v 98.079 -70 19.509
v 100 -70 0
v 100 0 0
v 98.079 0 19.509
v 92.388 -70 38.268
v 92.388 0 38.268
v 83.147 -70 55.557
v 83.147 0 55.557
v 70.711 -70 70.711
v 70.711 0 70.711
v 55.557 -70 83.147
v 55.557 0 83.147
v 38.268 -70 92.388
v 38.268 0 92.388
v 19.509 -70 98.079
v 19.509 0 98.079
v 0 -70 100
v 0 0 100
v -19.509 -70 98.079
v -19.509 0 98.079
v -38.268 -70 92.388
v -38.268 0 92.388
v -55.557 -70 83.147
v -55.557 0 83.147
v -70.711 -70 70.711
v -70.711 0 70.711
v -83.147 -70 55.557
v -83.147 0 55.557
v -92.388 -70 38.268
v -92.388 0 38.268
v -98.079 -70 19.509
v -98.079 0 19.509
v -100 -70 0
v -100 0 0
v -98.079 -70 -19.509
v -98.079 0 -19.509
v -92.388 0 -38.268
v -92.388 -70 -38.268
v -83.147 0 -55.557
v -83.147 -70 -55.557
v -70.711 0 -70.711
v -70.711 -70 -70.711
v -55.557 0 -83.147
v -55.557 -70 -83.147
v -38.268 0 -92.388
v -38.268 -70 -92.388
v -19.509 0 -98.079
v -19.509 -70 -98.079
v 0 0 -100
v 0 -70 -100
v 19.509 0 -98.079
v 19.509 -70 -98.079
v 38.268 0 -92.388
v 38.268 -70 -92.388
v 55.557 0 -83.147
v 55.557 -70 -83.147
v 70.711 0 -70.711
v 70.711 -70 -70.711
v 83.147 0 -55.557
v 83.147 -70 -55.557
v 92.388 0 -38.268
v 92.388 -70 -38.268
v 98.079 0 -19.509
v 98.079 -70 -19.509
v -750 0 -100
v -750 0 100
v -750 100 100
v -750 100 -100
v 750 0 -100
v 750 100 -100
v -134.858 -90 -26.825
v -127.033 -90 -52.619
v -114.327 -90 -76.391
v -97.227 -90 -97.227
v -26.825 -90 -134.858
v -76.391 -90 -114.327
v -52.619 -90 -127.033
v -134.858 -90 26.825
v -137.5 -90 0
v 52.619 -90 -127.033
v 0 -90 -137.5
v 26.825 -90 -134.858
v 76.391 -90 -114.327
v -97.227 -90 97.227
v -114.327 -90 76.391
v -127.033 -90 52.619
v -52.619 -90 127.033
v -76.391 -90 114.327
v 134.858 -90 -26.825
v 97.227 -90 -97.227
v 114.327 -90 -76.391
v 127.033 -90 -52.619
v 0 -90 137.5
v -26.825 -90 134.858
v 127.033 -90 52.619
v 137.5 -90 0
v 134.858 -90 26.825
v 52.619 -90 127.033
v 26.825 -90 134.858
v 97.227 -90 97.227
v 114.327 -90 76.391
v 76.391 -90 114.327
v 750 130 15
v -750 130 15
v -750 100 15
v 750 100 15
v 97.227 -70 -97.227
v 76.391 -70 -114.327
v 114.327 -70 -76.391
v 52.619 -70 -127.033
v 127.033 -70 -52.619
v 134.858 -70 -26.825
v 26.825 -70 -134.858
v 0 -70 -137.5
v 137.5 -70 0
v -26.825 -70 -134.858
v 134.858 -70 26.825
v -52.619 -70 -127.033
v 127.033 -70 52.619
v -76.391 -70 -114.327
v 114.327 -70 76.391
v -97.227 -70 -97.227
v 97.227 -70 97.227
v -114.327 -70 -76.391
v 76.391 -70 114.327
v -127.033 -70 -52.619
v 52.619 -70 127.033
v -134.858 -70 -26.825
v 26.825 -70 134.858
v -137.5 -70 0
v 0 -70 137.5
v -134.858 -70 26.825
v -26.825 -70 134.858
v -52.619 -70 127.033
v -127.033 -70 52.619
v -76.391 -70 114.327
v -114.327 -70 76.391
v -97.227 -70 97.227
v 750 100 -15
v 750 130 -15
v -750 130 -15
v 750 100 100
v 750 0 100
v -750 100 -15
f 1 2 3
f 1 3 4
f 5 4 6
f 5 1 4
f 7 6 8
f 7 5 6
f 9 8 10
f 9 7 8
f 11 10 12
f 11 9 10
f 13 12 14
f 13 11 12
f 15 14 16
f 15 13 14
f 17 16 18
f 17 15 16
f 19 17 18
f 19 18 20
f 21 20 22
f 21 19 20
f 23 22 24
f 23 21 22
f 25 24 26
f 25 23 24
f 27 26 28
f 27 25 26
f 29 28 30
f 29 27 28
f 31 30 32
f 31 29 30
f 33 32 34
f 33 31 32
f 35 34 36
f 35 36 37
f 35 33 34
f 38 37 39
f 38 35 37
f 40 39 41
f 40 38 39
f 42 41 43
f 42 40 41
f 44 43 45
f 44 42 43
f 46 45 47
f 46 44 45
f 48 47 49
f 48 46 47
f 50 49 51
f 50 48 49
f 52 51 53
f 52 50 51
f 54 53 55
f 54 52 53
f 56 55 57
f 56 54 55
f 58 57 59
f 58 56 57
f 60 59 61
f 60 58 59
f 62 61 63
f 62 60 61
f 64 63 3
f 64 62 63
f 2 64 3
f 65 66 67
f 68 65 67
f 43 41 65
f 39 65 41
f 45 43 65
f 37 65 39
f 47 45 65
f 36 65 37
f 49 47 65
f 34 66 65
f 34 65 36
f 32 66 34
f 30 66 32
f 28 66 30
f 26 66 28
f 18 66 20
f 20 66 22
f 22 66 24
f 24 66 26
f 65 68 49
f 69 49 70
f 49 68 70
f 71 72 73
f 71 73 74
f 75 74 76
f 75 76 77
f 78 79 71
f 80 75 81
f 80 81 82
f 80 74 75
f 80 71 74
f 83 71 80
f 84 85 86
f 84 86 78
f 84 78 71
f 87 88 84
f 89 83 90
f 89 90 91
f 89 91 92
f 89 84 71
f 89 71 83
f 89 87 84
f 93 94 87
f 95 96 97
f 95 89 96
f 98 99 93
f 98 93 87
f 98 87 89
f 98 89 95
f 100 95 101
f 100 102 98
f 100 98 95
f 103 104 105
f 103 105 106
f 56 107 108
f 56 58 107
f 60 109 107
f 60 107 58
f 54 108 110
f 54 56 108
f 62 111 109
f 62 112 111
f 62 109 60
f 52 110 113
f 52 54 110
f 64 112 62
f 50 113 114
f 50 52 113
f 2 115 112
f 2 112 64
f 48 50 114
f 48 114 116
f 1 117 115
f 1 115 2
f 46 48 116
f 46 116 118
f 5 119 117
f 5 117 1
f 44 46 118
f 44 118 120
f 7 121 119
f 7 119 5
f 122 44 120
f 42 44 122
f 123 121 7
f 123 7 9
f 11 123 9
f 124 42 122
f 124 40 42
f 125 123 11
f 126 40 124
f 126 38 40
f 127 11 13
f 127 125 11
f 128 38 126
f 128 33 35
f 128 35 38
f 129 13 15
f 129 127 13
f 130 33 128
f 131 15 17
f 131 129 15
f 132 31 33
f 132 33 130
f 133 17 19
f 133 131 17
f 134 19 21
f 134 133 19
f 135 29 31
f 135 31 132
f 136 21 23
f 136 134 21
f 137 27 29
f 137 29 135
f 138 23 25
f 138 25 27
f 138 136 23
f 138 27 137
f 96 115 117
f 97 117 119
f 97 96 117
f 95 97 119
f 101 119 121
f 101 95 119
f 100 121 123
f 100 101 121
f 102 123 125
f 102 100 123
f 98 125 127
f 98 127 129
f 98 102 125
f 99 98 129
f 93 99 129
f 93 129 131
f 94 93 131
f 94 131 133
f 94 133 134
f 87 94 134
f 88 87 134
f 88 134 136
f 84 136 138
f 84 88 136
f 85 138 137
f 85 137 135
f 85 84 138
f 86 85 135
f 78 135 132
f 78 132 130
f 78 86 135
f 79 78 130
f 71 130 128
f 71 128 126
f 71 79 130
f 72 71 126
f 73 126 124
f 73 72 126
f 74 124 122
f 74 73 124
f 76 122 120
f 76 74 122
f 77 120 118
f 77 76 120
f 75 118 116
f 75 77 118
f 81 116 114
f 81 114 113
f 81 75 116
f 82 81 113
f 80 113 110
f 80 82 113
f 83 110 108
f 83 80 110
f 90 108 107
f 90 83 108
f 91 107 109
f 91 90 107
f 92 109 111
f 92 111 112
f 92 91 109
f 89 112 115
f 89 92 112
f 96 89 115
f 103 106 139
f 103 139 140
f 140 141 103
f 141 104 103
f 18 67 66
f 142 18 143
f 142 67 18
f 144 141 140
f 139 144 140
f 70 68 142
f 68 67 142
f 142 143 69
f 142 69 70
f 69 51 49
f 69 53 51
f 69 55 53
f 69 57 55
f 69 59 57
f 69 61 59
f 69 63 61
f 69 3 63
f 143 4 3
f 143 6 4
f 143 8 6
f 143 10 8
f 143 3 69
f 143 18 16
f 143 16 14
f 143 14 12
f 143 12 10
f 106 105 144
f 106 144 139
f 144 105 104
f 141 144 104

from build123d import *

# Parameters (mm, degrees)
ESBO_O1_W                = 1500
ESBO_O1_H                = 100
RESSALTO_EXTRUS_O1_DEPTH = 100
ESBO_O3_W                = 1500
ESBO_O3_H                = 30
RESSALTO_EXTRUS_O3_DEPTH = 15


with BuildPart() as part:
    # Esboço1 → Ressalto-extrusão1 (new body, symmetric)
    with BuildSketch(Plane.XY):
        with Locations((0, 50)):
            Rectangle(ESBO_O1_W, ESBO_O1_H)
    extrude(amount=RESSALTO_EXTRUS_O1_DEPTH, both=True)

    # Esboço6 → Revolução1 (revolve)
    with BuildSketch(Plane.XY):
        Polygon((0, 0), (100, 0), (100, -70), (137.5, -70), (137.5, -90), (0, -90), align=None)
    revolve(axis=Axis((0, 0, 0), (0, -1, 0)))


with BuildPart() as body_2:
    # Esboço3 → Ressalto-extrusão3 (new body, symmetric)
    with BuildSketch(Plane.XY):
        with Locations((0, 115)):
            Rectangle(ESBO_O3_W, ESBO_O3_H)
    extrude(amount=RESSALTO_EXTRUS_O3_DEPTH, both=True)


solid = Compound([part.part, body_2.part])
